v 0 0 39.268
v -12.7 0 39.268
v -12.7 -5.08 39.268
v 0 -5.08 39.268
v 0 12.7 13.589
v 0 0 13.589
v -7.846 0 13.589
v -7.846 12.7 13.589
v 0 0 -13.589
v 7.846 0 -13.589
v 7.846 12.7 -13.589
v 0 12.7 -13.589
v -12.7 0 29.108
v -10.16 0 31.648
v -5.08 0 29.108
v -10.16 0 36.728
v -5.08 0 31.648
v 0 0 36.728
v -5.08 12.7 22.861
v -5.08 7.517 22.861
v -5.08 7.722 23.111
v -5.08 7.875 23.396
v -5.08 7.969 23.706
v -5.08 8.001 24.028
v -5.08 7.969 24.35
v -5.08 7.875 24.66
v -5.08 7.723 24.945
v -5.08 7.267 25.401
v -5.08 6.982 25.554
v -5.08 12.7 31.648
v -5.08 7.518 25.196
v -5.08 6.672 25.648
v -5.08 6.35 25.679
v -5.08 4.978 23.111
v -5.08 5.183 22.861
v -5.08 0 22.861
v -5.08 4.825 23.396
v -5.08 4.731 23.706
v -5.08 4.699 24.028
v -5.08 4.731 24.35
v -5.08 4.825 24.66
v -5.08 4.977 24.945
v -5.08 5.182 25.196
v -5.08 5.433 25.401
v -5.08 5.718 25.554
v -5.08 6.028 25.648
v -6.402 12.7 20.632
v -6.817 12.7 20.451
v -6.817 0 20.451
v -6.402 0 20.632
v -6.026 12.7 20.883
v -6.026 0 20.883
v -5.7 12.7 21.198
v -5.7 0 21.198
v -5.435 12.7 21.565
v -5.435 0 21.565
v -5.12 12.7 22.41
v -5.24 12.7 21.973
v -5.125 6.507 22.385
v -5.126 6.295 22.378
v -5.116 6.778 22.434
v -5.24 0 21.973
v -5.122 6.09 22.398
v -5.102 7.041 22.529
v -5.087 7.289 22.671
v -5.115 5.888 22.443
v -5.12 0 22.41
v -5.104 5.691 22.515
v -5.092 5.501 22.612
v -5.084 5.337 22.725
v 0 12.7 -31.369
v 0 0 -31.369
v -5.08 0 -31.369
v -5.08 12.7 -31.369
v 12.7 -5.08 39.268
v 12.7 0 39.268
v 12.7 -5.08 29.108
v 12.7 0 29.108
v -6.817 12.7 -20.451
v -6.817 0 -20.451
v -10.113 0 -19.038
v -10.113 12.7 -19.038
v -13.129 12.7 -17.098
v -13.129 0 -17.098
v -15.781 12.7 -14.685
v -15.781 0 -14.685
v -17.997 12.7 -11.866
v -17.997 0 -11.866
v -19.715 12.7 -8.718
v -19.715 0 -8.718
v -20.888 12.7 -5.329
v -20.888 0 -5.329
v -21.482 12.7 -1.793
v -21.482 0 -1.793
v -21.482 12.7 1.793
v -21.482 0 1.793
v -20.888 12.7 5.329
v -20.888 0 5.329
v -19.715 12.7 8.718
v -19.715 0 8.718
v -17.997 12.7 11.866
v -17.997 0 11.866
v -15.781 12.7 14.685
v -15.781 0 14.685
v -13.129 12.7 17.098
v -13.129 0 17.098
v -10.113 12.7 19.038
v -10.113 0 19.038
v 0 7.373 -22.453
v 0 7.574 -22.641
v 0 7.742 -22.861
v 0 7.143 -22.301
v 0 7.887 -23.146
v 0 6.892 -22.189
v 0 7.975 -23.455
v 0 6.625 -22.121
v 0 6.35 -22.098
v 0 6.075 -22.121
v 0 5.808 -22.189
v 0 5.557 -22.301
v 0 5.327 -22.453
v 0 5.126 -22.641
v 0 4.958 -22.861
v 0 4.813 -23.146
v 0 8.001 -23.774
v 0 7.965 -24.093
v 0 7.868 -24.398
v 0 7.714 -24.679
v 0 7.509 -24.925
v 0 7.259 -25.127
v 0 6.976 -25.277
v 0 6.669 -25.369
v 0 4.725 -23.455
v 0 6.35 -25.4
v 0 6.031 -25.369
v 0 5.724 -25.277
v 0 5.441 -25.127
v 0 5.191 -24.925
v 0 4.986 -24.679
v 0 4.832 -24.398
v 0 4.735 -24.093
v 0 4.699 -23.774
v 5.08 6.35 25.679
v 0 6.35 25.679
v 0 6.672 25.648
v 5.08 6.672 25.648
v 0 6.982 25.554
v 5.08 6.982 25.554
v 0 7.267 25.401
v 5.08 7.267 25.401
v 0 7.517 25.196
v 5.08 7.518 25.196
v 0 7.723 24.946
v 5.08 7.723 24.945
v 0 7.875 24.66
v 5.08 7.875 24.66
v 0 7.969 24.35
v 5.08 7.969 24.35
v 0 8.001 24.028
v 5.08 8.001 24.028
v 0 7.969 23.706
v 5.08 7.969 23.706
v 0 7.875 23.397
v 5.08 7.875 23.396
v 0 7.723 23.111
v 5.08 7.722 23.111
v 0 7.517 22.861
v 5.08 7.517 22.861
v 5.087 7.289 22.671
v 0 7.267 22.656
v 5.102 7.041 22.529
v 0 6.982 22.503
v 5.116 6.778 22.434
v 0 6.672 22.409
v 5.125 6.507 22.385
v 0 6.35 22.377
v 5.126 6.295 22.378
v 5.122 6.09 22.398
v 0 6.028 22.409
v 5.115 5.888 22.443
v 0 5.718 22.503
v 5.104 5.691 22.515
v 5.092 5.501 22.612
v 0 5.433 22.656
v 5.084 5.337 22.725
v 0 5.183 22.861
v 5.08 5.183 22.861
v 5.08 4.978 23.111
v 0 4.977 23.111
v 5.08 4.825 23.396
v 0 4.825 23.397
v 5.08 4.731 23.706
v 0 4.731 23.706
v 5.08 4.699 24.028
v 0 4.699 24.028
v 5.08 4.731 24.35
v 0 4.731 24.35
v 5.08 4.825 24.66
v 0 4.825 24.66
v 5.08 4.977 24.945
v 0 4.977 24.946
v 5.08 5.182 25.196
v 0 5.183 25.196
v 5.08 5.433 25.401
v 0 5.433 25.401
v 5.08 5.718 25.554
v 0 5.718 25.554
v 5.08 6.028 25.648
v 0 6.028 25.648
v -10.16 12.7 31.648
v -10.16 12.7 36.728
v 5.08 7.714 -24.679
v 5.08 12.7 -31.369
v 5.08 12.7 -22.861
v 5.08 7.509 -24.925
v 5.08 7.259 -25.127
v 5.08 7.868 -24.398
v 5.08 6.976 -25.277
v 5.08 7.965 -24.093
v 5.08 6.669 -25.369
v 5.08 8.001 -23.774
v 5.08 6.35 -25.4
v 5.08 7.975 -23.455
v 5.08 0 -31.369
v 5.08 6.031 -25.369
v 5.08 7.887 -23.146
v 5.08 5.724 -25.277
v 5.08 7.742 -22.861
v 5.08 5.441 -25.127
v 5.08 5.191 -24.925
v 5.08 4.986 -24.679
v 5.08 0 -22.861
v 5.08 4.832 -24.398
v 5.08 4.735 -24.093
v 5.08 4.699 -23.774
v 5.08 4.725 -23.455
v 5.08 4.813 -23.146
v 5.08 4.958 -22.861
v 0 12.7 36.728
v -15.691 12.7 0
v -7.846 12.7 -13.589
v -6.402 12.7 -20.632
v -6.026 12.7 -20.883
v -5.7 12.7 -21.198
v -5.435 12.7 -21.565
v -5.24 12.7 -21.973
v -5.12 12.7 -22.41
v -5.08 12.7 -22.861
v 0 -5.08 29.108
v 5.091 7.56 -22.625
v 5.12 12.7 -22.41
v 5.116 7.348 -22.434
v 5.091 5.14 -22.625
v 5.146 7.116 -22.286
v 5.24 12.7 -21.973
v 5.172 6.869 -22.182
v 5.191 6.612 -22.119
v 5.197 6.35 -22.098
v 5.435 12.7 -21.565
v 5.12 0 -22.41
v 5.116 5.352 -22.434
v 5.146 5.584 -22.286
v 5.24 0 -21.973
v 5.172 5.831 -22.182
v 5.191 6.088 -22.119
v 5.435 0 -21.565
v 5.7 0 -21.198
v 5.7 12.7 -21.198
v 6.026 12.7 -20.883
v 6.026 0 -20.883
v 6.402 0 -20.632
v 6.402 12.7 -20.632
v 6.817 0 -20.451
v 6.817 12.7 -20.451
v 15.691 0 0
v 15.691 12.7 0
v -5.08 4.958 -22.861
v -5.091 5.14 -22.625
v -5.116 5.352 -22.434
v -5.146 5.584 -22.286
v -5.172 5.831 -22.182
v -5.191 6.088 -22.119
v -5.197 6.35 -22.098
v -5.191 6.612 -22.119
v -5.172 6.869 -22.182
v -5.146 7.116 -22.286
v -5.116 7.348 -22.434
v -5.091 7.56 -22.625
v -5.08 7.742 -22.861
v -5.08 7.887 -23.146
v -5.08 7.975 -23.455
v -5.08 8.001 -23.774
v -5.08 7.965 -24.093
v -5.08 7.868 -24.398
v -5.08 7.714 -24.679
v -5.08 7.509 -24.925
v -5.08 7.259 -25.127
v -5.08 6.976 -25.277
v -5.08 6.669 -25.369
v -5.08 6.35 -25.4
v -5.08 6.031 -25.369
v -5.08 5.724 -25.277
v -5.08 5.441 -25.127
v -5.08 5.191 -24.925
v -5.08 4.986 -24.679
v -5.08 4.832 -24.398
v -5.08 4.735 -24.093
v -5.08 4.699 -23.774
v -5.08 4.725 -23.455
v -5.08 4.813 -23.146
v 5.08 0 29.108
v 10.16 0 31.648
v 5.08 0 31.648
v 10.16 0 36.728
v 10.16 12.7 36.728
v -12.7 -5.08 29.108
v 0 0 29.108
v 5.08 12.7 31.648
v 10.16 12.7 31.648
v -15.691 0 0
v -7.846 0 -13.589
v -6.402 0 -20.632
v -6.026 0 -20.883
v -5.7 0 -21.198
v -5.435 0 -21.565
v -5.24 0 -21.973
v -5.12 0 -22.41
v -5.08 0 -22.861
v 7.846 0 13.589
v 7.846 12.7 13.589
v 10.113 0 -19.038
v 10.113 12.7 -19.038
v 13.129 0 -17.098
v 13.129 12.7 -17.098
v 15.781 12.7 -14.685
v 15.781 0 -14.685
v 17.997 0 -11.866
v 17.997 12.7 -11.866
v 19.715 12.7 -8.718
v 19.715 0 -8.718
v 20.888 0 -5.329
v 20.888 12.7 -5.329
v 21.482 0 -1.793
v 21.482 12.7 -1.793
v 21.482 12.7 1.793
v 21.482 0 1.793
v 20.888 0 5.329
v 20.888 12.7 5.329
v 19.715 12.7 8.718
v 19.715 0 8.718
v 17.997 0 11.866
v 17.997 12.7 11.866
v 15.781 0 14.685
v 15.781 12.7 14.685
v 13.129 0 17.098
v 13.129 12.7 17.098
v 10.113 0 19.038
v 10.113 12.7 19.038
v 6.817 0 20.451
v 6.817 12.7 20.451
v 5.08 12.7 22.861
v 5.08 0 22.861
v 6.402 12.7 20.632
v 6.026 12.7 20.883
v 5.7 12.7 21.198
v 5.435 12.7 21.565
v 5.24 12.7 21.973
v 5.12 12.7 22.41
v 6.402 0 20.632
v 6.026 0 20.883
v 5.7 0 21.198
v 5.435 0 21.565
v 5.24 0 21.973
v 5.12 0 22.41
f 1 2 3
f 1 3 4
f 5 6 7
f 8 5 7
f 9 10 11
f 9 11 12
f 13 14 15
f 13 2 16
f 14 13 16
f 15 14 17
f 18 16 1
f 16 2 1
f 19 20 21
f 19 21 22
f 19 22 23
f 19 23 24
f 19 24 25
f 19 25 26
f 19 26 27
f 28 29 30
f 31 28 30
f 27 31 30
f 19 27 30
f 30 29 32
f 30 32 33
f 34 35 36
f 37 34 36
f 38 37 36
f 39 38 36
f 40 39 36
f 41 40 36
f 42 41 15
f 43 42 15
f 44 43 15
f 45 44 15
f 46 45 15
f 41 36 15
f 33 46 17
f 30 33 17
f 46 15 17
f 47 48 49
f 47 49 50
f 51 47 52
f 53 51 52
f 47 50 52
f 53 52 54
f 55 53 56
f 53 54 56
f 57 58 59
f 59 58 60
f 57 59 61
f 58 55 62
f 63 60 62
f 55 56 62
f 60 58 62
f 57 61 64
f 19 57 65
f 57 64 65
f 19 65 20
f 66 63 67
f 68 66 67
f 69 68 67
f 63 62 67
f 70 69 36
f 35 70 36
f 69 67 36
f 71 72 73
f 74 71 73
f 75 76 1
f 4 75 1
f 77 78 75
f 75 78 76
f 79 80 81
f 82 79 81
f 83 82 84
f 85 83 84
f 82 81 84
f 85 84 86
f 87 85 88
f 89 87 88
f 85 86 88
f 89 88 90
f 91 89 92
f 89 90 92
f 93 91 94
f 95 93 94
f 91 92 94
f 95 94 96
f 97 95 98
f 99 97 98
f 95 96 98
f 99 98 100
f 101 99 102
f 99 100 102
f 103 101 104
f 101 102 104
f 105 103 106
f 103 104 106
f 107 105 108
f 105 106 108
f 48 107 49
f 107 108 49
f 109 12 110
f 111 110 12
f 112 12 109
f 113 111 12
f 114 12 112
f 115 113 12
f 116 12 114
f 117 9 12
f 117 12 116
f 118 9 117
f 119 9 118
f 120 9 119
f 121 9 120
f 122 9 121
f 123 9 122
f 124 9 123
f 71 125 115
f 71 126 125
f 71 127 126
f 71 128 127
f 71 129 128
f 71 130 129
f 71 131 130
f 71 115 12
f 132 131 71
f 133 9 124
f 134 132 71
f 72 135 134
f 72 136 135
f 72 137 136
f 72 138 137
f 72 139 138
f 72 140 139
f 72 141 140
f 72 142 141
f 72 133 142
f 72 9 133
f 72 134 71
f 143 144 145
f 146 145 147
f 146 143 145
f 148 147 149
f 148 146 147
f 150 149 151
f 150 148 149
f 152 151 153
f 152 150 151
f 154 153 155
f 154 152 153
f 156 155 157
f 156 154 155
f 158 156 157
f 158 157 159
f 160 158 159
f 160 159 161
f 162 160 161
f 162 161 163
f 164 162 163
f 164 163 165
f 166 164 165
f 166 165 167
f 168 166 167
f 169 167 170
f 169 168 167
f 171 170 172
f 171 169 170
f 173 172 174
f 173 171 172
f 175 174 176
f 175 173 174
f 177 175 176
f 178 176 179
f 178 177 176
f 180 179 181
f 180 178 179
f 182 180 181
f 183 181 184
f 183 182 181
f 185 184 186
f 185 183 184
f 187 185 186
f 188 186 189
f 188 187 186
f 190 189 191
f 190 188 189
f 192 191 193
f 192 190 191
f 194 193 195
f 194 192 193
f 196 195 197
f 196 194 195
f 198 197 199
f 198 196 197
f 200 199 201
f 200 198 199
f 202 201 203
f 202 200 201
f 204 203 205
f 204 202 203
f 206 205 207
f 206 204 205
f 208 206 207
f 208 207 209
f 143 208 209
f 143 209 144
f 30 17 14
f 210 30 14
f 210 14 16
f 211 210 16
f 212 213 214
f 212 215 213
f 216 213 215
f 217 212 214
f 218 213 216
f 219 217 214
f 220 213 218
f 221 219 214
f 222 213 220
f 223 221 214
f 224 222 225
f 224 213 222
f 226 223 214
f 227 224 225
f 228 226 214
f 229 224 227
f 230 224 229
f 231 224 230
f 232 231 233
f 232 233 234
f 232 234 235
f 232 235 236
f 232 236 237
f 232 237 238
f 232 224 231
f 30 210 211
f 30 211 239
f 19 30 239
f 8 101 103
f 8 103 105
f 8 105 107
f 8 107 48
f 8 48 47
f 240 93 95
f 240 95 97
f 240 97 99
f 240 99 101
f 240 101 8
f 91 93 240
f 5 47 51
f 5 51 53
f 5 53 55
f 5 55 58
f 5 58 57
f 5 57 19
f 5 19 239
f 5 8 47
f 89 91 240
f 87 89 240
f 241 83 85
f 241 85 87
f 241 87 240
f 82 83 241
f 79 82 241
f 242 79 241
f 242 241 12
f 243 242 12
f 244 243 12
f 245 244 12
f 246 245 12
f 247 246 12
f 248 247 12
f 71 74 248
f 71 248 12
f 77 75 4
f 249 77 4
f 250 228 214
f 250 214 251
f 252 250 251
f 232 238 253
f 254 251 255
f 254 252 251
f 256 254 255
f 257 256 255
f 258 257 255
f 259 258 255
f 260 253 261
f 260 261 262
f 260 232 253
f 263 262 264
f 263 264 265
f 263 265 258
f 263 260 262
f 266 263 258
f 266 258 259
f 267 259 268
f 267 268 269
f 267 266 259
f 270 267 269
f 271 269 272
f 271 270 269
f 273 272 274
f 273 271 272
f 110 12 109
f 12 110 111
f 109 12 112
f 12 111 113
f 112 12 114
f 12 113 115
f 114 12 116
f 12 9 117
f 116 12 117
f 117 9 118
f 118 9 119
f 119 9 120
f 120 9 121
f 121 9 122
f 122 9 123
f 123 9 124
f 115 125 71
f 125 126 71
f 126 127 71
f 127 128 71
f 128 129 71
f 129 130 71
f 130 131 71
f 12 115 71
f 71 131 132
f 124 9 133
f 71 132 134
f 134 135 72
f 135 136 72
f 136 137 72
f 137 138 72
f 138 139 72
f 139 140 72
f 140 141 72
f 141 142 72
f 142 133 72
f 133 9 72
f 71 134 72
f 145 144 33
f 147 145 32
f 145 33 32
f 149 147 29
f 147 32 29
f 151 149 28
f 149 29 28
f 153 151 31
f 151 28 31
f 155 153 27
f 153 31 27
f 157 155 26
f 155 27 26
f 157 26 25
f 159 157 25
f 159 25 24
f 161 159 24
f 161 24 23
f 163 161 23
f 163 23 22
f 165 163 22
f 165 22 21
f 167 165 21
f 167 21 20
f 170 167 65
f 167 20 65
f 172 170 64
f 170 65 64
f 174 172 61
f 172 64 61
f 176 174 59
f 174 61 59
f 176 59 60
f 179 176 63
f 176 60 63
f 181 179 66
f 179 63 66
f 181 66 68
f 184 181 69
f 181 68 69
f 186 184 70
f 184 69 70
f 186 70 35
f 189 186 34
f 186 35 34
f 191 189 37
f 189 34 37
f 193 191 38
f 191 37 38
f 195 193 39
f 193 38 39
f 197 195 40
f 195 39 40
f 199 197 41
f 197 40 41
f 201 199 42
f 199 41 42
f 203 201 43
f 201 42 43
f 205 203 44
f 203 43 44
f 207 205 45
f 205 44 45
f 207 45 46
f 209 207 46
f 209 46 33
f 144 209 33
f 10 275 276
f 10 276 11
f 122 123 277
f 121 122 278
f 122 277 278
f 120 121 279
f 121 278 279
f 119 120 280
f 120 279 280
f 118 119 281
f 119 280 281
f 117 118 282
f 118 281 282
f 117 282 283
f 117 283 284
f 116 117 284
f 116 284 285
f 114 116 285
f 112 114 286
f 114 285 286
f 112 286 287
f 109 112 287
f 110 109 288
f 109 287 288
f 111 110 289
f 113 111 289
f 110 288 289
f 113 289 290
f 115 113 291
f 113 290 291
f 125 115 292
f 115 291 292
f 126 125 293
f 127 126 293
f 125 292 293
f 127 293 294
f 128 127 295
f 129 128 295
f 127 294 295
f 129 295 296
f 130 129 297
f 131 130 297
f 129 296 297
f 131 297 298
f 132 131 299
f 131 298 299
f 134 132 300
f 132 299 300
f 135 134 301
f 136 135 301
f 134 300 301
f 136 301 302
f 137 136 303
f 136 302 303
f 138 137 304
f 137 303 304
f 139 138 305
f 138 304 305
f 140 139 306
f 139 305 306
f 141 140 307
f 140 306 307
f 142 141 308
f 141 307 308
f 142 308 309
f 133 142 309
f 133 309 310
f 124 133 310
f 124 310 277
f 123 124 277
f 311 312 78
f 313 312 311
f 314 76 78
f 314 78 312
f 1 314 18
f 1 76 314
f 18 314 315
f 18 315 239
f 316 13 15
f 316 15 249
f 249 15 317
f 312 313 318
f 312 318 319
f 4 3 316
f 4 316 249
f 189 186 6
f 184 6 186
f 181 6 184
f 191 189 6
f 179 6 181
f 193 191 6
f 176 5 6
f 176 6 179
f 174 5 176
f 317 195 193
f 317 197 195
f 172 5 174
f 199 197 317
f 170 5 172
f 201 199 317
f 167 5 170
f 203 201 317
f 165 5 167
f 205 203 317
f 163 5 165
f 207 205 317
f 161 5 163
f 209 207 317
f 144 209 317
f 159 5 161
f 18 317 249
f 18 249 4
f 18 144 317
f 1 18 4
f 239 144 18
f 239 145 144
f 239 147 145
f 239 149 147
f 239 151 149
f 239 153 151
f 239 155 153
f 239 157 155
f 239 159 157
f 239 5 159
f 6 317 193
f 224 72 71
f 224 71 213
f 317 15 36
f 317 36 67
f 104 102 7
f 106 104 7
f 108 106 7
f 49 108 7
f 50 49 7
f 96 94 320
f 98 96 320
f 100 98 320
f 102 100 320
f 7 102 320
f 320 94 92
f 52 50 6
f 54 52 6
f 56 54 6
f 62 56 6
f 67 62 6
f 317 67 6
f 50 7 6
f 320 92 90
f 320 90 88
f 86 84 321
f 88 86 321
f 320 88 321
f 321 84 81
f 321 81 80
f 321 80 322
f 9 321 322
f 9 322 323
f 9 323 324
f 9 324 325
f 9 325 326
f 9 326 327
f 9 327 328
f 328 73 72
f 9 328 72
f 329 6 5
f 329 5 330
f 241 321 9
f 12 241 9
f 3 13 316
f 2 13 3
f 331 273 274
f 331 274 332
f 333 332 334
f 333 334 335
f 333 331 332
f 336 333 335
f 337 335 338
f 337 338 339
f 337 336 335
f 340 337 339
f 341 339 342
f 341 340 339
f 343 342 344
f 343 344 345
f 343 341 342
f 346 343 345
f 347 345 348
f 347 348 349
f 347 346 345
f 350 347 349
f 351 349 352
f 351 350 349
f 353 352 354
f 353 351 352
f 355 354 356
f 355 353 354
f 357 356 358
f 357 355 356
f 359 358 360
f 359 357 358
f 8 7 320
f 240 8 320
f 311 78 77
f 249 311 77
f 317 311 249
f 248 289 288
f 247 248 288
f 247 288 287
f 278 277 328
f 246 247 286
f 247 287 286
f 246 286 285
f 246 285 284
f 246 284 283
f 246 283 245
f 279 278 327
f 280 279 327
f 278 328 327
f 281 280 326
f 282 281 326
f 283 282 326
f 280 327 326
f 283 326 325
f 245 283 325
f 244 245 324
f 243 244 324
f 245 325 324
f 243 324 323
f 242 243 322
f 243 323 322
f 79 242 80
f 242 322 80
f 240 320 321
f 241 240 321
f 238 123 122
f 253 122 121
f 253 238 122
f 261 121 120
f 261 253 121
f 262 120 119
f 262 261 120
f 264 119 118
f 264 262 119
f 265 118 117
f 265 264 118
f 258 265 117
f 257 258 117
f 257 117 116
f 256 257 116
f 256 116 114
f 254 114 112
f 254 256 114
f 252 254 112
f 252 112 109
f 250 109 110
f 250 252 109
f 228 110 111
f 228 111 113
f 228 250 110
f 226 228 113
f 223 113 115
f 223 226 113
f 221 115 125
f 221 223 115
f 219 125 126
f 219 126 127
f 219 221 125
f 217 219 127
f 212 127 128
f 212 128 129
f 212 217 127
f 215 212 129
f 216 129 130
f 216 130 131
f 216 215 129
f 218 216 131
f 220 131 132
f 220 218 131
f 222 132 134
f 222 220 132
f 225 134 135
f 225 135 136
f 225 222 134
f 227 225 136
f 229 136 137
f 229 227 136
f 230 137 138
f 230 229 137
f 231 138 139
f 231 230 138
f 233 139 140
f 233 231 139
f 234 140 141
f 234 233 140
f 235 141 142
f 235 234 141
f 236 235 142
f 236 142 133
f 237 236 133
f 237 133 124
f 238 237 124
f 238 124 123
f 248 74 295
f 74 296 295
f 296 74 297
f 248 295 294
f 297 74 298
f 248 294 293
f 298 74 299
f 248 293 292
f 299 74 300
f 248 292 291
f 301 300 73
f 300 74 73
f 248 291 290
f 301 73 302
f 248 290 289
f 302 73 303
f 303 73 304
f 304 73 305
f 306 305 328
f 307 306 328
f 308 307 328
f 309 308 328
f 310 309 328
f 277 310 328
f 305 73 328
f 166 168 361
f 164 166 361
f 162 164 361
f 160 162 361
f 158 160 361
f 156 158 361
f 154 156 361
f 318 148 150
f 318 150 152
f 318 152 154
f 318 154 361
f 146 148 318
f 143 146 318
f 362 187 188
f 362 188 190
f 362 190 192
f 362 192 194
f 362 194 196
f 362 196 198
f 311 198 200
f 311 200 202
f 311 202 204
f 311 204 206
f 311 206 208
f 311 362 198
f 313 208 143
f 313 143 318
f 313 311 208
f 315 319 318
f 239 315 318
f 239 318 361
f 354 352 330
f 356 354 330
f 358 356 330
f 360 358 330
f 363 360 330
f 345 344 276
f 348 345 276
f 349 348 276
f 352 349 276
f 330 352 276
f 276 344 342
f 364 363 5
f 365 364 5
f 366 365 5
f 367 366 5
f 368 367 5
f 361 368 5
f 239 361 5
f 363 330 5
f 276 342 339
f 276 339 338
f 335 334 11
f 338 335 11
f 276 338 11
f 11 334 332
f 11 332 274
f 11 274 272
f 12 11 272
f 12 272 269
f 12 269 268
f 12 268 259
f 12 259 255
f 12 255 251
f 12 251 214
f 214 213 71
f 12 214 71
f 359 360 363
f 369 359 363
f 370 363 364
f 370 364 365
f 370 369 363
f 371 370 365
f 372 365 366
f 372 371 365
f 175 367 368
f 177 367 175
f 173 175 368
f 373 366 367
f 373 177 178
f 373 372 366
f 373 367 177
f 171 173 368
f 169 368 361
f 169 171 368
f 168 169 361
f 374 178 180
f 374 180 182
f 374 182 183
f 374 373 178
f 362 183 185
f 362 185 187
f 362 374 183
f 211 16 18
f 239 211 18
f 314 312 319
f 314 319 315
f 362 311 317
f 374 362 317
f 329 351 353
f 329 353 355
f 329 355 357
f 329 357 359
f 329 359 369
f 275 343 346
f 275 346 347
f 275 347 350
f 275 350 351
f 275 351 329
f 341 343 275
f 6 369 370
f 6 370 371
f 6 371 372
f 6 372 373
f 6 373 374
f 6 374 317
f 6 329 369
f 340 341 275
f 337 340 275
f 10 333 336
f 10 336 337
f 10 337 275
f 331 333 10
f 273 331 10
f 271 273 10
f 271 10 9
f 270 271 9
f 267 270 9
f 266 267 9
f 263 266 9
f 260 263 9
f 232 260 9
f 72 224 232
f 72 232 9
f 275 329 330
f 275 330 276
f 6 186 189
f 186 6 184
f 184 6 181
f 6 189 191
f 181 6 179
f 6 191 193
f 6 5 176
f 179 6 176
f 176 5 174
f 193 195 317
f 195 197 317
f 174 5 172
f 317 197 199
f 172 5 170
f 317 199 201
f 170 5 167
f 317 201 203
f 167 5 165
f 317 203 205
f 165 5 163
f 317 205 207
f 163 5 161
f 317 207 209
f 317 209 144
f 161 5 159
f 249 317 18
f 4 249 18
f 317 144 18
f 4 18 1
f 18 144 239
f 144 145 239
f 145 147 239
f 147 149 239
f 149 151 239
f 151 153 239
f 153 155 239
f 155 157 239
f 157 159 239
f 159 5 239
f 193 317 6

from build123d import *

# Parameters (mm, degrees)
BOSS_EXTRUDE1_DEPTH     = 12.7
SKETCH2_R               = 1.651
CUT_EXTRUDE1_DEPTH      = 17.477104351
CUT_EXTRUDE1_DEPTH_BACK = 6.08
SKETCH3_W               = 12.7
SKETCH3_H               = 10.16
BOSS_EXTRUDE2_DEPTH     = 5.08


with BuildPart() as part:
    # Sketch1 → Boss-Extrude1 (new body)
    with BuildSketch(Plane(origin=(0, 0, 0), x_dir=(1, 0, 0), z_dir=(0, 1, 0))):
        with BuildLine():
            Line((-5.08, 13.589), (0, 13.589))
            Line((0, 13.589), (0, 18.669))
            Line((0, 18.669), (0, 31.369))
            Line((0, 31.369), (-5.08, 31.369))
            Line((-5.08, 31.369), (-5.08, 22.860578254))
            ThreePointArc((-5.08, 22.860578254), (-5.559450485, 21.375406313), (-6.81679976, 20.450916582))
            ThreePointArc((-6.81679976, 20.450916582), (-21.557104351, 0), (-6.81679976, -20.450916582))
            ThreePointArc((-6.81679976, -20.450916582), (-5.559450485, -21.375406313), (-5.08, -22.860578254))
            Line((-5.08, -22.860578254), (-5.08, -31.6484))
            Line((-5.08, -31.6484), (-10.16, -31.6484))
            Line((-10.16, -31.6484), (-10.16, -36.7284))
            Line((-10.16, -36.7284), (-5.08, -36.7284))
            Line((-5.08, -36.7284), (0, -36.7284))
            Line((0, -36.7284), (0, -31.6484))
            Line((0, -31.6484), (0, -18.669))
            Line((0, -18.669), (0, -13.589))
            Line((0, -13.589), (-5.08, -13.589))
            Line((-5.08, -13.589), (-7.845612808, -13.589))
            Line((-7.845612808, -13.589), (-15.691225616, 0))
            Line((-15.691225616, 0), (-7.845612808, 13.589))
            Line((-7.845612808, 13.589), (-5.08, 13.589))
        make_face()
    extrude(amount=BOSS_EXTRUDE1_DEPTH)

    # Sketch2 → Cut-Extrude1 (cut, two sides)
    with BuildSketch(Plane.ZY.offset(5.08)) as cut_extrude1_sk:
        with BuildLine():
            ThreePointArc((-22.860578254, 4.958415363), (-22.301142047, 5.556584378), (-22.098, 6.35))
            ThreePointArc((-22.098, 6.35), (-22.301142047, 7.143415622), (-22.860578254, 7.741584637))
            Line((-22.860578254, 7.741584637), (-22.860578254, 4.958415363))
        make_face()
        with BuildLine():
            Line((-22.860578254, 4.958415363), (-22.860578254, 7.741584637))
            ThreePointArc((-22.860578254, 7.741584637), (-25.4, 6.35), (-22.860578254, 4.958415363))
        make_face()
        with Locations((24.0284, 6.35)):
            Circle(SKETCH2_R)
    extrude(amount=CUT_EXTRUDE1_DEPTH, mode=Mode.SUBTRACT)
    extrude(cut_extrude1_sk.sketch, amount=-CUT_EXTRUDE1_DEPTH_BACK, mode=Mode.SUBTRACT)

    # Sketch3 → Boss-Extrude2 (add)
    with BuildSketch(Plane.XZ):
        with Locations((-6.35, 34.1884)):
            Rectangle(SKETCH3_W, SKETCH3_H)
    extrude(amount=BOSS_EXTRUDE2_DEPTH)


with BuildPart() as body_2:
    # Mirror1: mirrored copy
    add(part.part.mirror(Plane(origin=(0, 12.7, 0), x_dir=(0, 0, 1), z_dir=(1, 0, 0))))


solid = Compound([part.part, body_2.part])
